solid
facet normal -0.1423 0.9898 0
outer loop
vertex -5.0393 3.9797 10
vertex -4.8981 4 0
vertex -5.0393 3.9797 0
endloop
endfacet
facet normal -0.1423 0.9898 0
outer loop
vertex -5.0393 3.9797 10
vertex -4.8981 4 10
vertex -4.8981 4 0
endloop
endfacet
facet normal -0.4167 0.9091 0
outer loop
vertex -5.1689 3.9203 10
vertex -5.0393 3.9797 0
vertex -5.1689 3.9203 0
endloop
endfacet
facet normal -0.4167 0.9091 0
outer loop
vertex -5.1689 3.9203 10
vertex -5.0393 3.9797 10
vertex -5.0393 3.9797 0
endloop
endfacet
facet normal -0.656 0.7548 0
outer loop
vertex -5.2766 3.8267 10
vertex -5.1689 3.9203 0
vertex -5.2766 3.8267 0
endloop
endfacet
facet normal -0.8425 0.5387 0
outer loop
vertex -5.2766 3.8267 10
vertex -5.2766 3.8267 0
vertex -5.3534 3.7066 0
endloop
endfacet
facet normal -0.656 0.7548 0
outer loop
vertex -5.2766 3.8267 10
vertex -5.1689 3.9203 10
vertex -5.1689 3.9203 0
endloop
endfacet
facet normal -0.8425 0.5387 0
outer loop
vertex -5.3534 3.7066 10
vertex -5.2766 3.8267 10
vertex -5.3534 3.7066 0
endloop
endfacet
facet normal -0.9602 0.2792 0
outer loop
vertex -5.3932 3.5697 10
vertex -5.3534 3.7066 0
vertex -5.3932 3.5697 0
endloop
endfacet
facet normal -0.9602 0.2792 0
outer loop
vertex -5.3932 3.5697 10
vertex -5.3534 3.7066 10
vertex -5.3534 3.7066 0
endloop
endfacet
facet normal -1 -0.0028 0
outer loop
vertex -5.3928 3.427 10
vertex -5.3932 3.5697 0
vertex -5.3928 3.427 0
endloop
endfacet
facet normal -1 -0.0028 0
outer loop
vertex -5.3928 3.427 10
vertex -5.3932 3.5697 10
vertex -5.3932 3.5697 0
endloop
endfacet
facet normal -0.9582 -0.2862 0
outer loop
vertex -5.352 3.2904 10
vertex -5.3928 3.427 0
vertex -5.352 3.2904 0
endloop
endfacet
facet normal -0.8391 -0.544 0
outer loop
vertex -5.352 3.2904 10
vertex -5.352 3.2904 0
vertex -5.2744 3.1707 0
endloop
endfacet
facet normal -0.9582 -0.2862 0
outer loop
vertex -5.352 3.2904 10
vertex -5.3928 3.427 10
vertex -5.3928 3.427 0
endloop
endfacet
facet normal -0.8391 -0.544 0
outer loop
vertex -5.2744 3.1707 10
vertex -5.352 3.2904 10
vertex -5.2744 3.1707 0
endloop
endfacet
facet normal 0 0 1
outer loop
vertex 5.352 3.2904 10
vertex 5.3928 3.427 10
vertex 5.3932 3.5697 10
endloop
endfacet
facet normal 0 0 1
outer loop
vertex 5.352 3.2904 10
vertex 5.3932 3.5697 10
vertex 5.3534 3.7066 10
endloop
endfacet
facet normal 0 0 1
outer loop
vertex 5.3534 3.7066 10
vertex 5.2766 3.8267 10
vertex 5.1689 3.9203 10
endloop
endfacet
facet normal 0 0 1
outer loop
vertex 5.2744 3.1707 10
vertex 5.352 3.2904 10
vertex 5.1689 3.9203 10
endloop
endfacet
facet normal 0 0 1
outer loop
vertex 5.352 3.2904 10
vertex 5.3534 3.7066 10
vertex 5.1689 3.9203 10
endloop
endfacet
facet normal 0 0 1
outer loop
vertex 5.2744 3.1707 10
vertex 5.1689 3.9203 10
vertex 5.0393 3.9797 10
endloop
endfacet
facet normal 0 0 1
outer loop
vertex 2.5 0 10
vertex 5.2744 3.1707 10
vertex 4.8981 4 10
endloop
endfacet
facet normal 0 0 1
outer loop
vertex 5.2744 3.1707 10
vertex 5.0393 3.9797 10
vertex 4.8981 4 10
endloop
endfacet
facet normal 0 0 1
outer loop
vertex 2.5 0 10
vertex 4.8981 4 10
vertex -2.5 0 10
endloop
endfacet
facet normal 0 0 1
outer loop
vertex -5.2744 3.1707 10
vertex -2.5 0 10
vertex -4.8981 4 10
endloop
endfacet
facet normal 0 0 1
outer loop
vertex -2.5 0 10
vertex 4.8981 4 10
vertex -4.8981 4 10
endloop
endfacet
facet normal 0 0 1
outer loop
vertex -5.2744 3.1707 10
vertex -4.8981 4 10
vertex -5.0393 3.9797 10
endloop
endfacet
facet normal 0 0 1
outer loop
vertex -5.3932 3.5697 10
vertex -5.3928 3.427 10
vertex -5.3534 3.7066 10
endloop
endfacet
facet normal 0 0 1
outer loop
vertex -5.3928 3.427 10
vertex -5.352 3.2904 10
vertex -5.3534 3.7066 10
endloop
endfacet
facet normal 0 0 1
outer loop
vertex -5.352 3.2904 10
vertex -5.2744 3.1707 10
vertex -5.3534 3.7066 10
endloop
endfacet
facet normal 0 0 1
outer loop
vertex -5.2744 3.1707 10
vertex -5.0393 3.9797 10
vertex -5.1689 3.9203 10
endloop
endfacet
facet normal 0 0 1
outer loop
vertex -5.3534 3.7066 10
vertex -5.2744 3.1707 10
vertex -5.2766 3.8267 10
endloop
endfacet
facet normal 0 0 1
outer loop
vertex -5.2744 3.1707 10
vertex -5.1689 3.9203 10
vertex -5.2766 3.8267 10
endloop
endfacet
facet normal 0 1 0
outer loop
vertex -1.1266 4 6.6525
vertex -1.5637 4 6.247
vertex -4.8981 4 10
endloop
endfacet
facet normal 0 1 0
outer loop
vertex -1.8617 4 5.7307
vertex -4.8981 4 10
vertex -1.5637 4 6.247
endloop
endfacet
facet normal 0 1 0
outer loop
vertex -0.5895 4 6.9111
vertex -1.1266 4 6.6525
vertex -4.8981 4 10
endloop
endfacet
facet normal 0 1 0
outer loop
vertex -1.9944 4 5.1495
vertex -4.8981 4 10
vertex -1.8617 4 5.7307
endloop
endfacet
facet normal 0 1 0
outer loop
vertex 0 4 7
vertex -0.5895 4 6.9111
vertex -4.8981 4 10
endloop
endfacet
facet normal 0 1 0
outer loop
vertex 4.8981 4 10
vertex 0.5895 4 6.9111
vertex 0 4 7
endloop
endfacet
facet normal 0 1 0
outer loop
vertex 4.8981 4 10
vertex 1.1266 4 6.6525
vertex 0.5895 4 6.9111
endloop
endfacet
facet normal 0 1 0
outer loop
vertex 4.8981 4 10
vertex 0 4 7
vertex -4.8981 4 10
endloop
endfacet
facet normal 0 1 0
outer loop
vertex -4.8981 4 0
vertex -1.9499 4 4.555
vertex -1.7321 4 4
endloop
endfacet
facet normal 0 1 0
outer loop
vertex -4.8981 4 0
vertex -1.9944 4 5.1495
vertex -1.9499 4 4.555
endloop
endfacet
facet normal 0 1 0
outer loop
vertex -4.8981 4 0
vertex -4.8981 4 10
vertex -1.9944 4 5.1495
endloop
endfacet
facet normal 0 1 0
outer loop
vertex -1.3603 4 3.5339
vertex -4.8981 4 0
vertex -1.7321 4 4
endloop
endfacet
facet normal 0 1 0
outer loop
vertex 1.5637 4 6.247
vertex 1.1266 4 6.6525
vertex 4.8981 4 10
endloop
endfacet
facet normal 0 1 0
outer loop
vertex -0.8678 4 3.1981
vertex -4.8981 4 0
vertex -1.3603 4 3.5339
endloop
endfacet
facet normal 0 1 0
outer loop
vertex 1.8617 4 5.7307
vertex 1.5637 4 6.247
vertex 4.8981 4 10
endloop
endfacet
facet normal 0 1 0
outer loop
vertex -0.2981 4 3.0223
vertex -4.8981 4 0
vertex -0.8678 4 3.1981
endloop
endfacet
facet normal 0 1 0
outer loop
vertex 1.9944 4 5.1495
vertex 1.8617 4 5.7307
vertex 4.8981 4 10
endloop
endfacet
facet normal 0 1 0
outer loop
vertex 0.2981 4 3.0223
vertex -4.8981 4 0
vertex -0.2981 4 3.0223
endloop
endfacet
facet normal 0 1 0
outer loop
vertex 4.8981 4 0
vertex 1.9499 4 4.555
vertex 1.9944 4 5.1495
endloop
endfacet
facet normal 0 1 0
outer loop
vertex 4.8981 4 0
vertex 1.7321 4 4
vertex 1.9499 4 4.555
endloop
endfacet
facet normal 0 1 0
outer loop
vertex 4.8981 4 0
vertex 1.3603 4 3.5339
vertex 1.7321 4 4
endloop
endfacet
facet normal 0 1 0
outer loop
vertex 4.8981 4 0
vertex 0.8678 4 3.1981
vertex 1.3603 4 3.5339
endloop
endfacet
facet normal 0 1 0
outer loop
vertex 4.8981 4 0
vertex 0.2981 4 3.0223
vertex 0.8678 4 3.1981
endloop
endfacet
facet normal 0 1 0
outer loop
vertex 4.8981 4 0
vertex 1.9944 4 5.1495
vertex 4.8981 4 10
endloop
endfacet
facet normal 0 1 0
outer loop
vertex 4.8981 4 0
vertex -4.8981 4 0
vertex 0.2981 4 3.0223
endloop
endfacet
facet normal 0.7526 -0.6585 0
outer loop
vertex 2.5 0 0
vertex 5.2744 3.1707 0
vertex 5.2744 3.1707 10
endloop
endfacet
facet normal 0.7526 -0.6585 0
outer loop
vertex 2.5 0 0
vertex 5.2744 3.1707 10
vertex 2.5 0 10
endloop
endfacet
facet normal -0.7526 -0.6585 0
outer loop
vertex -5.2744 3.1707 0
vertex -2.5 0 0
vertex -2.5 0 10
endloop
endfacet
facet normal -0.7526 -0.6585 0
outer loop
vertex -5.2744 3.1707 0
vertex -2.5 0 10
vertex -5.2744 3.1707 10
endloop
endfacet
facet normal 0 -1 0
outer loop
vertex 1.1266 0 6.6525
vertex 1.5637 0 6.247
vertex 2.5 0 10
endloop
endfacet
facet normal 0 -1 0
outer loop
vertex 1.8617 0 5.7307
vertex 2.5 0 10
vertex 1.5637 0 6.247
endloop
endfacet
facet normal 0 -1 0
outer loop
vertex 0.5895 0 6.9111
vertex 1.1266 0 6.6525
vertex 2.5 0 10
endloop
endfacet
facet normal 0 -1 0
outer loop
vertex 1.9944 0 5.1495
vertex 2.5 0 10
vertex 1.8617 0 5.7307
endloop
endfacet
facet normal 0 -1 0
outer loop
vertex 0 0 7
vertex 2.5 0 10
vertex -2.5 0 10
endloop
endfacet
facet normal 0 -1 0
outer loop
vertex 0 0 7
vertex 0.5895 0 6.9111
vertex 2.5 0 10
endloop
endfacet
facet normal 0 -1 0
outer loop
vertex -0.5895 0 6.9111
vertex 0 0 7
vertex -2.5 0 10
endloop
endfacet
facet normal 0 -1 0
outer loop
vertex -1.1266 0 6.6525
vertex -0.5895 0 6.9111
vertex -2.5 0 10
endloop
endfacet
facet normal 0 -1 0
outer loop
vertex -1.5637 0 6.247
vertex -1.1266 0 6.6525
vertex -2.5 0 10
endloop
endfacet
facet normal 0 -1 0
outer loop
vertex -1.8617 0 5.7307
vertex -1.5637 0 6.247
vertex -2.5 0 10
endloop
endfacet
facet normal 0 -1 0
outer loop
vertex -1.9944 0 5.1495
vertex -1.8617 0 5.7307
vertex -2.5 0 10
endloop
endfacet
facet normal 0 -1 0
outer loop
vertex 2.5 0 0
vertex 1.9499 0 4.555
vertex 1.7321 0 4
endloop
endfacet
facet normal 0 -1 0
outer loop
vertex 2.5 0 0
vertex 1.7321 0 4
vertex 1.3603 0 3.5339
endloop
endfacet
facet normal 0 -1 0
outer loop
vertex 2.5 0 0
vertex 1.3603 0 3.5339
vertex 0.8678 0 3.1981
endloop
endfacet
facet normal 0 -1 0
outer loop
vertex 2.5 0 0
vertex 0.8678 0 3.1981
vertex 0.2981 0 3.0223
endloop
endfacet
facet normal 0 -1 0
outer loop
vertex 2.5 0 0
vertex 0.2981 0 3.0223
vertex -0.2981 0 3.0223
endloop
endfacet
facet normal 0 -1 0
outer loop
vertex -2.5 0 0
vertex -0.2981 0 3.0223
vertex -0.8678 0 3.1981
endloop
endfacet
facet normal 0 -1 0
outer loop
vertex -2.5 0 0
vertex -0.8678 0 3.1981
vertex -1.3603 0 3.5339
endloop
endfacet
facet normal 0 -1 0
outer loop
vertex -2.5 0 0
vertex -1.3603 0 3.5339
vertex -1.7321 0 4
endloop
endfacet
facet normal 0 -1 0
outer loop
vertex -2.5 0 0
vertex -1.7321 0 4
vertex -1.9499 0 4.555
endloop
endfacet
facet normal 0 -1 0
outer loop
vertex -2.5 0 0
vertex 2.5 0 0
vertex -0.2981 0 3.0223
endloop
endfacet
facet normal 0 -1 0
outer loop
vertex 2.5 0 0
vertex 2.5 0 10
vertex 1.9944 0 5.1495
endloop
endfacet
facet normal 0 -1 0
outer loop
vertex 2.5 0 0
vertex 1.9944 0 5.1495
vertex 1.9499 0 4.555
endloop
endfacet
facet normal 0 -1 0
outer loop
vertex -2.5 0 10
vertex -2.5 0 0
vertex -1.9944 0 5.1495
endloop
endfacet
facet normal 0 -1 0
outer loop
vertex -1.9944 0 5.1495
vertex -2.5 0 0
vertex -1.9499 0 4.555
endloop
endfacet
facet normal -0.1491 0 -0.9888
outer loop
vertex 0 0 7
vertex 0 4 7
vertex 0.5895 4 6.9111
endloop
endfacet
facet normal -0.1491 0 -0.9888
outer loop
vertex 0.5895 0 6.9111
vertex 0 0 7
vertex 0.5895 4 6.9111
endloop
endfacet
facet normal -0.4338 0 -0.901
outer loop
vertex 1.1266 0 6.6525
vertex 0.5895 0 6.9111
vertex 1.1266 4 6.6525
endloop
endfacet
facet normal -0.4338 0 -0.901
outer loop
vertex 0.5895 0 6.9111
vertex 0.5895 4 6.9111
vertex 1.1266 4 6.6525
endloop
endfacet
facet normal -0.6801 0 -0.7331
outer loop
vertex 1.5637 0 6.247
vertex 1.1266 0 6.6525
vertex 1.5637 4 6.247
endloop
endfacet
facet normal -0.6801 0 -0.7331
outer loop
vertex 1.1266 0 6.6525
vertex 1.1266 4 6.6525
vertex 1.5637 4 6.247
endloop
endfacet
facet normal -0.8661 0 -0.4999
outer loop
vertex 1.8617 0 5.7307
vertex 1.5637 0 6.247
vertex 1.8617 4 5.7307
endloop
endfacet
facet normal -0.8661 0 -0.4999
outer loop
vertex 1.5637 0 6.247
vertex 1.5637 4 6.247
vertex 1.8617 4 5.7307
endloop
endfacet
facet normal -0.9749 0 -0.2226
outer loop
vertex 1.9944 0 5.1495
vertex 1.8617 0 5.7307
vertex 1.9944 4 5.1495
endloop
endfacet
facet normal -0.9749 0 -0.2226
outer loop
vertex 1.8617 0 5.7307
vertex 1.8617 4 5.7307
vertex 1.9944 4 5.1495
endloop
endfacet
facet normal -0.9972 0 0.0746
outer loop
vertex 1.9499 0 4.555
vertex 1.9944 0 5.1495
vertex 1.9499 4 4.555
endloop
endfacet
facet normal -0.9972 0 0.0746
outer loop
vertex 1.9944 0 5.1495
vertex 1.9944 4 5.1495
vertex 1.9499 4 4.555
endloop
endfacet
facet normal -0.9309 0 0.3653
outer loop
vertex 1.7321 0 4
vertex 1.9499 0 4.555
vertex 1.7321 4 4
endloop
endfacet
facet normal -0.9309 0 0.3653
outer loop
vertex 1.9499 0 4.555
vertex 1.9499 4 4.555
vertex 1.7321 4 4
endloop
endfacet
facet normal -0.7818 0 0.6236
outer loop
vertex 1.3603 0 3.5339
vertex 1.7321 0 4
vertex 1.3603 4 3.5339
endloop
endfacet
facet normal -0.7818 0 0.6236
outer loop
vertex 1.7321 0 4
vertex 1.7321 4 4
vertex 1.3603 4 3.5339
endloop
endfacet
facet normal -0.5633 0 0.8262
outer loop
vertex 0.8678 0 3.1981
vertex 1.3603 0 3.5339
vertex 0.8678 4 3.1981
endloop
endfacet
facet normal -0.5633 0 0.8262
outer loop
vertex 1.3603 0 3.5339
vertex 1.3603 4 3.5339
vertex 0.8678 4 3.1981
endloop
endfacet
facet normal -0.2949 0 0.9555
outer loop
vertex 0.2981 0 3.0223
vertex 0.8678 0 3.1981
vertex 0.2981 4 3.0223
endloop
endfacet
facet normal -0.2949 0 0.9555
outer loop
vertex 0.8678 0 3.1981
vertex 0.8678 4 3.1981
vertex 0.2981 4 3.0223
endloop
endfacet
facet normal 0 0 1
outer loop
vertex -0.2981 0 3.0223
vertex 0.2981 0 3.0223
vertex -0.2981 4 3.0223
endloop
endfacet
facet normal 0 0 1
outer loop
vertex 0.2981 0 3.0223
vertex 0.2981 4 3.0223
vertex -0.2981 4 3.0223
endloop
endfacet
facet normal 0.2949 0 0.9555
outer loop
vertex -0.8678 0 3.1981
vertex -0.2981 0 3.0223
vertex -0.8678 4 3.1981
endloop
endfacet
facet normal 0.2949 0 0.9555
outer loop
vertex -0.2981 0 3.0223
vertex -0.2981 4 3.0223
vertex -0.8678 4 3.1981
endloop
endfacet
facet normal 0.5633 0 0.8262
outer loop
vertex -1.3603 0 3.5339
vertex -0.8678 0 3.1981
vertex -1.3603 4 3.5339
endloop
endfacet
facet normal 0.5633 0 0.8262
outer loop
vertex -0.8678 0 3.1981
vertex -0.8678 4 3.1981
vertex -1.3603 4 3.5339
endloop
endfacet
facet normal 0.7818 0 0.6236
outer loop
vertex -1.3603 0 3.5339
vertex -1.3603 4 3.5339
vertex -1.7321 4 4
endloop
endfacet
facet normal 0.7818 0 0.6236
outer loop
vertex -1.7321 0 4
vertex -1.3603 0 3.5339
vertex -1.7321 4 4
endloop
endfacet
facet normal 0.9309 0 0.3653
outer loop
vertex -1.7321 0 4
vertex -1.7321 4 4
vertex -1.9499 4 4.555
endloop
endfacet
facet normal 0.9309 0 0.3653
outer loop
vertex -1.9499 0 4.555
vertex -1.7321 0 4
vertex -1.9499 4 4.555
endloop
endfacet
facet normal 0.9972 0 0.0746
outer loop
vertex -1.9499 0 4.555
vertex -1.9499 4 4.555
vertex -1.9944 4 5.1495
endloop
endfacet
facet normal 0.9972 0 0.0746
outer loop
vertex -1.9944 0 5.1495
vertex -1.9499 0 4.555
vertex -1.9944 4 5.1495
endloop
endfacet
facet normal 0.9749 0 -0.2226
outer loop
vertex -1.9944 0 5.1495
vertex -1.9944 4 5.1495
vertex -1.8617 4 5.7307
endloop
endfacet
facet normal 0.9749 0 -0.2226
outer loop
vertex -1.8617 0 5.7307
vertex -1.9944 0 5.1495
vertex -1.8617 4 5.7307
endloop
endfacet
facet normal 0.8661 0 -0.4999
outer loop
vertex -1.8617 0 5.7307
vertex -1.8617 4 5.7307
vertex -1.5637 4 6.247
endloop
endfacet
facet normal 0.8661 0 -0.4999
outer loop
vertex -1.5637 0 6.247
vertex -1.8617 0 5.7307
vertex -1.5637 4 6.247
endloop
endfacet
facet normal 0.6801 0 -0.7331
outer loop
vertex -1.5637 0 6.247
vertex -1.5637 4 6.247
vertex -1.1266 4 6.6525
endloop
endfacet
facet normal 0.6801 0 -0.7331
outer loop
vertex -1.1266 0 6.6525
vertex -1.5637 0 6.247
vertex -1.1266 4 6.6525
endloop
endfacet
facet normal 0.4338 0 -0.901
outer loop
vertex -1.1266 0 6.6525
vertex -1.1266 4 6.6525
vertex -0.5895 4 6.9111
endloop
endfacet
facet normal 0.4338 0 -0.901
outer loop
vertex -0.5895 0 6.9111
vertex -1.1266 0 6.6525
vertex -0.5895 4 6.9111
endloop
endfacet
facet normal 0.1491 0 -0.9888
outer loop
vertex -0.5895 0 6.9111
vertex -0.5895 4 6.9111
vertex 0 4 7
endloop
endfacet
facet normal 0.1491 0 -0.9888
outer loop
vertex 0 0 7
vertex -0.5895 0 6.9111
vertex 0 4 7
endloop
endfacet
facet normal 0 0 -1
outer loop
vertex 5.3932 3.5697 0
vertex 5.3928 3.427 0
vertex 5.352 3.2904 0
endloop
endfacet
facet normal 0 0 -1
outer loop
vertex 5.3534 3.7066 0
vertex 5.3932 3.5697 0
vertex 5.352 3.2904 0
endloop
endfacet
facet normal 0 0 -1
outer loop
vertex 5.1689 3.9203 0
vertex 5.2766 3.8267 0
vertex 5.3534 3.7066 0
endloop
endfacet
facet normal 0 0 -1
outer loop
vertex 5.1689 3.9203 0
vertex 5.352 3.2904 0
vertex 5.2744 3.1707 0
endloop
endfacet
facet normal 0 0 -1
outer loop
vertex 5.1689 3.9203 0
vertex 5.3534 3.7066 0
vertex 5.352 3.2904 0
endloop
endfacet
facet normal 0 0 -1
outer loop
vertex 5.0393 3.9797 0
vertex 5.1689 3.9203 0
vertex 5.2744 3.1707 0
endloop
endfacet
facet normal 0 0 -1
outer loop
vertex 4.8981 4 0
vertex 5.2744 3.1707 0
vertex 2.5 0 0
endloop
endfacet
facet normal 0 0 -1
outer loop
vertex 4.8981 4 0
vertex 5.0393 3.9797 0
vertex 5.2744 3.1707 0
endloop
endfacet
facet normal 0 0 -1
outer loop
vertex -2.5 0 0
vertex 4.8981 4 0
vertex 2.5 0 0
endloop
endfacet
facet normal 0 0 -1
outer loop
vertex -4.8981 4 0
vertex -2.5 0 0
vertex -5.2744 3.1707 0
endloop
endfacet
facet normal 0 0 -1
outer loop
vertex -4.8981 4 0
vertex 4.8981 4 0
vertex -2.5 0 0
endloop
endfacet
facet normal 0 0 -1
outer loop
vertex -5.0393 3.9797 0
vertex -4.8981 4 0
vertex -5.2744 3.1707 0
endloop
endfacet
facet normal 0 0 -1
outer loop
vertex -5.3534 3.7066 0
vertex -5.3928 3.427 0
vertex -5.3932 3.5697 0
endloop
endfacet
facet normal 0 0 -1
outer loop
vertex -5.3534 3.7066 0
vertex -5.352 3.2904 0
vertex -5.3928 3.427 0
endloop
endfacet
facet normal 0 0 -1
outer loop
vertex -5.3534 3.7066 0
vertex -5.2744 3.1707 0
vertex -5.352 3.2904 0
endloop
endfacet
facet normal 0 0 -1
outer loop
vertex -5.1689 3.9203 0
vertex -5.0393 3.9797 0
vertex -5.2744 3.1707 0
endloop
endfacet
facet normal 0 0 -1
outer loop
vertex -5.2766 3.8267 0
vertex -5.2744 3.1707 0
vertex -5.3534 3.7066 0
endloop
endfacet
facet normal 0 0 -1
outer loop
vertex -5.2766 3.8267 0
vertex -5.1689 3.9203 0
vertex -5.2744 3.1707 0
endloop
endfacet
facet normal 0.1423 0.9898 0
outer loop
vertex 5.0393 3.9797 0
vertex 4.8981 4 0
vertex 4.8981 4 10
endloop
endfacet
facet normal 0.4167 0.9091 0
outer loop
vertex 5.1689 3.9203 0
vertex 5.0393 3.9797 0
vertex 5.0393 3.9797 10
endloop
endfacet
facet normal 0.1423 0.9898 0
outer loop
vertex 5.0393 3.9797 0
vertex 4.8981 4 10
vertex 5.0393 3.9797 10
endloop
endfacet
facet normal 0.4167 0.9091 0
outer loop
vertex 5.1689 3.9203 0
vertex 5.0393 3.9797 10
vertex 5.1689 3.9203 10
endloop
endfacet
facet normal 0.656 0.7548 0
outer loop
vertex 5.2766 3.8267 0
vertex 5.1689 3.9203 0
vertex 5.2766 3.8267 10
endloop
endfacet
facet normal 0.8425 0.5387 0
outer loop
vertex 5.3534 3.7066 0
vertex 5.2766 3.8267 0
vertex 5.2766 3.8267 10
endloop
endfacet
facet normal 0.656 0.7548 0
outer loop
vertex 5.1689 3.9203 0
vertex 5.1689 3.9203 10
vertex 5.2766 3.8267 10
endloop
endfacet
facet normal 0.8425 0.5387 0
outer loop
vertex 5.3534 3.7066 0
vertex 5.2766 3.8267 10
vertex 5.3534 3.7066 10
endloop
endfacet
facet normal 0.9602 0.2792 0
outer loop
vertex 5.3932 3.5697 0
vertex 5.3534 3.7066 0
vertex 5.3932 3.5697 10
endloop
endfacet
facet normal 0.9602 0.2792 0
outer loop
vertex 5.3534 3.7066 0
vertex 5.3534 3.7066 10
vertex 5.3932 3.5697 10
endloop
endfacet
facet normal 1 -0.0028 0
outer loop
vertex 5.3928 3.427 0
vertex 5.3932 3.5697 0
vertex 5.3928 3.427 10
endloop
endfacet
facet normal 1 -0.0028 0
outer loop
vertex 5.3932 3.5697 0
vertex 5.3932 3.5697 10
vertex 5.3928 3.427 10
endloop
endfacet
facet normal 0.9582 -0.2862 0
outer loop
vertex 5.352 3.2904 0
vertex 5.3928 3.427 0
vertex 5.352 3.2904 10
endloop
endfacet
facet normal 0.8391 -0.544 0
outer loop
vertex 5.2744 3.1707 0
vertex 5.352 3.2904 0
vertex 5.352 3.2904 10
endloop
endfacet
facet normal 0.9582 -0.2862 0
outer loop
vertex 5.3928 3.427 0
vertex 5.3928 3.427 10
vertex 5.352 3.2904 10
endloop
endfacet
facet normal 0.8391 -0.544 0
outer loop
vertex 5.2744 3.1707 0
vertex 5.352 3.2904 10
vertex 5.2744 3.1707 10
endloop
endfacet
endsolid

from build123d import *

# Parameters (mm, degrees)
EXTRUDE_1_DEPTH     = 10
SKETCH_3_R          = 2
CUT_EXTRUDE_1_DEPTH = 13.328828006
FILLET_2_R          = 0.5


with BuildPart() as part:
    # ｽｹｯﾁ2 → ﾎﾞｽ - 押し出し1 (new body)
    with BuildSketch(Plane.XY):
        Polygon((-6, 4), (6, 4), (2.5, 0), (-2.5, 0), align=None)
    extrude(amount=EXTRUDE_1_DEPTH)

    # ｽｹｯﾁ3 → ｶｯﾄ - 押し出し1 (cut, through all)
    with BuildSketch(Plane(origin=(0, 4, 0), x_dir=(1, 0, 0), z_dir=(0, 1, 0))):
        with Locations(Location((0, -5, 0), (0, 0, 270))):
            Circle(SKETCH_3_R)
    extrude(amount=-CUT_EXTRUDE_1_DEPTH, mode=Mode.SUBTRACT)

    # ﾌｨﾚｯﾄ2
    fillet_2_edges = [part.edges().sort_by_distance(p)[0] for p in [
        (-6, 4, 5),
        (6, 4, 5),
    ]]
    fillet(fillet_2_edges, radius=FILLET_2_R)


solid = part.part
